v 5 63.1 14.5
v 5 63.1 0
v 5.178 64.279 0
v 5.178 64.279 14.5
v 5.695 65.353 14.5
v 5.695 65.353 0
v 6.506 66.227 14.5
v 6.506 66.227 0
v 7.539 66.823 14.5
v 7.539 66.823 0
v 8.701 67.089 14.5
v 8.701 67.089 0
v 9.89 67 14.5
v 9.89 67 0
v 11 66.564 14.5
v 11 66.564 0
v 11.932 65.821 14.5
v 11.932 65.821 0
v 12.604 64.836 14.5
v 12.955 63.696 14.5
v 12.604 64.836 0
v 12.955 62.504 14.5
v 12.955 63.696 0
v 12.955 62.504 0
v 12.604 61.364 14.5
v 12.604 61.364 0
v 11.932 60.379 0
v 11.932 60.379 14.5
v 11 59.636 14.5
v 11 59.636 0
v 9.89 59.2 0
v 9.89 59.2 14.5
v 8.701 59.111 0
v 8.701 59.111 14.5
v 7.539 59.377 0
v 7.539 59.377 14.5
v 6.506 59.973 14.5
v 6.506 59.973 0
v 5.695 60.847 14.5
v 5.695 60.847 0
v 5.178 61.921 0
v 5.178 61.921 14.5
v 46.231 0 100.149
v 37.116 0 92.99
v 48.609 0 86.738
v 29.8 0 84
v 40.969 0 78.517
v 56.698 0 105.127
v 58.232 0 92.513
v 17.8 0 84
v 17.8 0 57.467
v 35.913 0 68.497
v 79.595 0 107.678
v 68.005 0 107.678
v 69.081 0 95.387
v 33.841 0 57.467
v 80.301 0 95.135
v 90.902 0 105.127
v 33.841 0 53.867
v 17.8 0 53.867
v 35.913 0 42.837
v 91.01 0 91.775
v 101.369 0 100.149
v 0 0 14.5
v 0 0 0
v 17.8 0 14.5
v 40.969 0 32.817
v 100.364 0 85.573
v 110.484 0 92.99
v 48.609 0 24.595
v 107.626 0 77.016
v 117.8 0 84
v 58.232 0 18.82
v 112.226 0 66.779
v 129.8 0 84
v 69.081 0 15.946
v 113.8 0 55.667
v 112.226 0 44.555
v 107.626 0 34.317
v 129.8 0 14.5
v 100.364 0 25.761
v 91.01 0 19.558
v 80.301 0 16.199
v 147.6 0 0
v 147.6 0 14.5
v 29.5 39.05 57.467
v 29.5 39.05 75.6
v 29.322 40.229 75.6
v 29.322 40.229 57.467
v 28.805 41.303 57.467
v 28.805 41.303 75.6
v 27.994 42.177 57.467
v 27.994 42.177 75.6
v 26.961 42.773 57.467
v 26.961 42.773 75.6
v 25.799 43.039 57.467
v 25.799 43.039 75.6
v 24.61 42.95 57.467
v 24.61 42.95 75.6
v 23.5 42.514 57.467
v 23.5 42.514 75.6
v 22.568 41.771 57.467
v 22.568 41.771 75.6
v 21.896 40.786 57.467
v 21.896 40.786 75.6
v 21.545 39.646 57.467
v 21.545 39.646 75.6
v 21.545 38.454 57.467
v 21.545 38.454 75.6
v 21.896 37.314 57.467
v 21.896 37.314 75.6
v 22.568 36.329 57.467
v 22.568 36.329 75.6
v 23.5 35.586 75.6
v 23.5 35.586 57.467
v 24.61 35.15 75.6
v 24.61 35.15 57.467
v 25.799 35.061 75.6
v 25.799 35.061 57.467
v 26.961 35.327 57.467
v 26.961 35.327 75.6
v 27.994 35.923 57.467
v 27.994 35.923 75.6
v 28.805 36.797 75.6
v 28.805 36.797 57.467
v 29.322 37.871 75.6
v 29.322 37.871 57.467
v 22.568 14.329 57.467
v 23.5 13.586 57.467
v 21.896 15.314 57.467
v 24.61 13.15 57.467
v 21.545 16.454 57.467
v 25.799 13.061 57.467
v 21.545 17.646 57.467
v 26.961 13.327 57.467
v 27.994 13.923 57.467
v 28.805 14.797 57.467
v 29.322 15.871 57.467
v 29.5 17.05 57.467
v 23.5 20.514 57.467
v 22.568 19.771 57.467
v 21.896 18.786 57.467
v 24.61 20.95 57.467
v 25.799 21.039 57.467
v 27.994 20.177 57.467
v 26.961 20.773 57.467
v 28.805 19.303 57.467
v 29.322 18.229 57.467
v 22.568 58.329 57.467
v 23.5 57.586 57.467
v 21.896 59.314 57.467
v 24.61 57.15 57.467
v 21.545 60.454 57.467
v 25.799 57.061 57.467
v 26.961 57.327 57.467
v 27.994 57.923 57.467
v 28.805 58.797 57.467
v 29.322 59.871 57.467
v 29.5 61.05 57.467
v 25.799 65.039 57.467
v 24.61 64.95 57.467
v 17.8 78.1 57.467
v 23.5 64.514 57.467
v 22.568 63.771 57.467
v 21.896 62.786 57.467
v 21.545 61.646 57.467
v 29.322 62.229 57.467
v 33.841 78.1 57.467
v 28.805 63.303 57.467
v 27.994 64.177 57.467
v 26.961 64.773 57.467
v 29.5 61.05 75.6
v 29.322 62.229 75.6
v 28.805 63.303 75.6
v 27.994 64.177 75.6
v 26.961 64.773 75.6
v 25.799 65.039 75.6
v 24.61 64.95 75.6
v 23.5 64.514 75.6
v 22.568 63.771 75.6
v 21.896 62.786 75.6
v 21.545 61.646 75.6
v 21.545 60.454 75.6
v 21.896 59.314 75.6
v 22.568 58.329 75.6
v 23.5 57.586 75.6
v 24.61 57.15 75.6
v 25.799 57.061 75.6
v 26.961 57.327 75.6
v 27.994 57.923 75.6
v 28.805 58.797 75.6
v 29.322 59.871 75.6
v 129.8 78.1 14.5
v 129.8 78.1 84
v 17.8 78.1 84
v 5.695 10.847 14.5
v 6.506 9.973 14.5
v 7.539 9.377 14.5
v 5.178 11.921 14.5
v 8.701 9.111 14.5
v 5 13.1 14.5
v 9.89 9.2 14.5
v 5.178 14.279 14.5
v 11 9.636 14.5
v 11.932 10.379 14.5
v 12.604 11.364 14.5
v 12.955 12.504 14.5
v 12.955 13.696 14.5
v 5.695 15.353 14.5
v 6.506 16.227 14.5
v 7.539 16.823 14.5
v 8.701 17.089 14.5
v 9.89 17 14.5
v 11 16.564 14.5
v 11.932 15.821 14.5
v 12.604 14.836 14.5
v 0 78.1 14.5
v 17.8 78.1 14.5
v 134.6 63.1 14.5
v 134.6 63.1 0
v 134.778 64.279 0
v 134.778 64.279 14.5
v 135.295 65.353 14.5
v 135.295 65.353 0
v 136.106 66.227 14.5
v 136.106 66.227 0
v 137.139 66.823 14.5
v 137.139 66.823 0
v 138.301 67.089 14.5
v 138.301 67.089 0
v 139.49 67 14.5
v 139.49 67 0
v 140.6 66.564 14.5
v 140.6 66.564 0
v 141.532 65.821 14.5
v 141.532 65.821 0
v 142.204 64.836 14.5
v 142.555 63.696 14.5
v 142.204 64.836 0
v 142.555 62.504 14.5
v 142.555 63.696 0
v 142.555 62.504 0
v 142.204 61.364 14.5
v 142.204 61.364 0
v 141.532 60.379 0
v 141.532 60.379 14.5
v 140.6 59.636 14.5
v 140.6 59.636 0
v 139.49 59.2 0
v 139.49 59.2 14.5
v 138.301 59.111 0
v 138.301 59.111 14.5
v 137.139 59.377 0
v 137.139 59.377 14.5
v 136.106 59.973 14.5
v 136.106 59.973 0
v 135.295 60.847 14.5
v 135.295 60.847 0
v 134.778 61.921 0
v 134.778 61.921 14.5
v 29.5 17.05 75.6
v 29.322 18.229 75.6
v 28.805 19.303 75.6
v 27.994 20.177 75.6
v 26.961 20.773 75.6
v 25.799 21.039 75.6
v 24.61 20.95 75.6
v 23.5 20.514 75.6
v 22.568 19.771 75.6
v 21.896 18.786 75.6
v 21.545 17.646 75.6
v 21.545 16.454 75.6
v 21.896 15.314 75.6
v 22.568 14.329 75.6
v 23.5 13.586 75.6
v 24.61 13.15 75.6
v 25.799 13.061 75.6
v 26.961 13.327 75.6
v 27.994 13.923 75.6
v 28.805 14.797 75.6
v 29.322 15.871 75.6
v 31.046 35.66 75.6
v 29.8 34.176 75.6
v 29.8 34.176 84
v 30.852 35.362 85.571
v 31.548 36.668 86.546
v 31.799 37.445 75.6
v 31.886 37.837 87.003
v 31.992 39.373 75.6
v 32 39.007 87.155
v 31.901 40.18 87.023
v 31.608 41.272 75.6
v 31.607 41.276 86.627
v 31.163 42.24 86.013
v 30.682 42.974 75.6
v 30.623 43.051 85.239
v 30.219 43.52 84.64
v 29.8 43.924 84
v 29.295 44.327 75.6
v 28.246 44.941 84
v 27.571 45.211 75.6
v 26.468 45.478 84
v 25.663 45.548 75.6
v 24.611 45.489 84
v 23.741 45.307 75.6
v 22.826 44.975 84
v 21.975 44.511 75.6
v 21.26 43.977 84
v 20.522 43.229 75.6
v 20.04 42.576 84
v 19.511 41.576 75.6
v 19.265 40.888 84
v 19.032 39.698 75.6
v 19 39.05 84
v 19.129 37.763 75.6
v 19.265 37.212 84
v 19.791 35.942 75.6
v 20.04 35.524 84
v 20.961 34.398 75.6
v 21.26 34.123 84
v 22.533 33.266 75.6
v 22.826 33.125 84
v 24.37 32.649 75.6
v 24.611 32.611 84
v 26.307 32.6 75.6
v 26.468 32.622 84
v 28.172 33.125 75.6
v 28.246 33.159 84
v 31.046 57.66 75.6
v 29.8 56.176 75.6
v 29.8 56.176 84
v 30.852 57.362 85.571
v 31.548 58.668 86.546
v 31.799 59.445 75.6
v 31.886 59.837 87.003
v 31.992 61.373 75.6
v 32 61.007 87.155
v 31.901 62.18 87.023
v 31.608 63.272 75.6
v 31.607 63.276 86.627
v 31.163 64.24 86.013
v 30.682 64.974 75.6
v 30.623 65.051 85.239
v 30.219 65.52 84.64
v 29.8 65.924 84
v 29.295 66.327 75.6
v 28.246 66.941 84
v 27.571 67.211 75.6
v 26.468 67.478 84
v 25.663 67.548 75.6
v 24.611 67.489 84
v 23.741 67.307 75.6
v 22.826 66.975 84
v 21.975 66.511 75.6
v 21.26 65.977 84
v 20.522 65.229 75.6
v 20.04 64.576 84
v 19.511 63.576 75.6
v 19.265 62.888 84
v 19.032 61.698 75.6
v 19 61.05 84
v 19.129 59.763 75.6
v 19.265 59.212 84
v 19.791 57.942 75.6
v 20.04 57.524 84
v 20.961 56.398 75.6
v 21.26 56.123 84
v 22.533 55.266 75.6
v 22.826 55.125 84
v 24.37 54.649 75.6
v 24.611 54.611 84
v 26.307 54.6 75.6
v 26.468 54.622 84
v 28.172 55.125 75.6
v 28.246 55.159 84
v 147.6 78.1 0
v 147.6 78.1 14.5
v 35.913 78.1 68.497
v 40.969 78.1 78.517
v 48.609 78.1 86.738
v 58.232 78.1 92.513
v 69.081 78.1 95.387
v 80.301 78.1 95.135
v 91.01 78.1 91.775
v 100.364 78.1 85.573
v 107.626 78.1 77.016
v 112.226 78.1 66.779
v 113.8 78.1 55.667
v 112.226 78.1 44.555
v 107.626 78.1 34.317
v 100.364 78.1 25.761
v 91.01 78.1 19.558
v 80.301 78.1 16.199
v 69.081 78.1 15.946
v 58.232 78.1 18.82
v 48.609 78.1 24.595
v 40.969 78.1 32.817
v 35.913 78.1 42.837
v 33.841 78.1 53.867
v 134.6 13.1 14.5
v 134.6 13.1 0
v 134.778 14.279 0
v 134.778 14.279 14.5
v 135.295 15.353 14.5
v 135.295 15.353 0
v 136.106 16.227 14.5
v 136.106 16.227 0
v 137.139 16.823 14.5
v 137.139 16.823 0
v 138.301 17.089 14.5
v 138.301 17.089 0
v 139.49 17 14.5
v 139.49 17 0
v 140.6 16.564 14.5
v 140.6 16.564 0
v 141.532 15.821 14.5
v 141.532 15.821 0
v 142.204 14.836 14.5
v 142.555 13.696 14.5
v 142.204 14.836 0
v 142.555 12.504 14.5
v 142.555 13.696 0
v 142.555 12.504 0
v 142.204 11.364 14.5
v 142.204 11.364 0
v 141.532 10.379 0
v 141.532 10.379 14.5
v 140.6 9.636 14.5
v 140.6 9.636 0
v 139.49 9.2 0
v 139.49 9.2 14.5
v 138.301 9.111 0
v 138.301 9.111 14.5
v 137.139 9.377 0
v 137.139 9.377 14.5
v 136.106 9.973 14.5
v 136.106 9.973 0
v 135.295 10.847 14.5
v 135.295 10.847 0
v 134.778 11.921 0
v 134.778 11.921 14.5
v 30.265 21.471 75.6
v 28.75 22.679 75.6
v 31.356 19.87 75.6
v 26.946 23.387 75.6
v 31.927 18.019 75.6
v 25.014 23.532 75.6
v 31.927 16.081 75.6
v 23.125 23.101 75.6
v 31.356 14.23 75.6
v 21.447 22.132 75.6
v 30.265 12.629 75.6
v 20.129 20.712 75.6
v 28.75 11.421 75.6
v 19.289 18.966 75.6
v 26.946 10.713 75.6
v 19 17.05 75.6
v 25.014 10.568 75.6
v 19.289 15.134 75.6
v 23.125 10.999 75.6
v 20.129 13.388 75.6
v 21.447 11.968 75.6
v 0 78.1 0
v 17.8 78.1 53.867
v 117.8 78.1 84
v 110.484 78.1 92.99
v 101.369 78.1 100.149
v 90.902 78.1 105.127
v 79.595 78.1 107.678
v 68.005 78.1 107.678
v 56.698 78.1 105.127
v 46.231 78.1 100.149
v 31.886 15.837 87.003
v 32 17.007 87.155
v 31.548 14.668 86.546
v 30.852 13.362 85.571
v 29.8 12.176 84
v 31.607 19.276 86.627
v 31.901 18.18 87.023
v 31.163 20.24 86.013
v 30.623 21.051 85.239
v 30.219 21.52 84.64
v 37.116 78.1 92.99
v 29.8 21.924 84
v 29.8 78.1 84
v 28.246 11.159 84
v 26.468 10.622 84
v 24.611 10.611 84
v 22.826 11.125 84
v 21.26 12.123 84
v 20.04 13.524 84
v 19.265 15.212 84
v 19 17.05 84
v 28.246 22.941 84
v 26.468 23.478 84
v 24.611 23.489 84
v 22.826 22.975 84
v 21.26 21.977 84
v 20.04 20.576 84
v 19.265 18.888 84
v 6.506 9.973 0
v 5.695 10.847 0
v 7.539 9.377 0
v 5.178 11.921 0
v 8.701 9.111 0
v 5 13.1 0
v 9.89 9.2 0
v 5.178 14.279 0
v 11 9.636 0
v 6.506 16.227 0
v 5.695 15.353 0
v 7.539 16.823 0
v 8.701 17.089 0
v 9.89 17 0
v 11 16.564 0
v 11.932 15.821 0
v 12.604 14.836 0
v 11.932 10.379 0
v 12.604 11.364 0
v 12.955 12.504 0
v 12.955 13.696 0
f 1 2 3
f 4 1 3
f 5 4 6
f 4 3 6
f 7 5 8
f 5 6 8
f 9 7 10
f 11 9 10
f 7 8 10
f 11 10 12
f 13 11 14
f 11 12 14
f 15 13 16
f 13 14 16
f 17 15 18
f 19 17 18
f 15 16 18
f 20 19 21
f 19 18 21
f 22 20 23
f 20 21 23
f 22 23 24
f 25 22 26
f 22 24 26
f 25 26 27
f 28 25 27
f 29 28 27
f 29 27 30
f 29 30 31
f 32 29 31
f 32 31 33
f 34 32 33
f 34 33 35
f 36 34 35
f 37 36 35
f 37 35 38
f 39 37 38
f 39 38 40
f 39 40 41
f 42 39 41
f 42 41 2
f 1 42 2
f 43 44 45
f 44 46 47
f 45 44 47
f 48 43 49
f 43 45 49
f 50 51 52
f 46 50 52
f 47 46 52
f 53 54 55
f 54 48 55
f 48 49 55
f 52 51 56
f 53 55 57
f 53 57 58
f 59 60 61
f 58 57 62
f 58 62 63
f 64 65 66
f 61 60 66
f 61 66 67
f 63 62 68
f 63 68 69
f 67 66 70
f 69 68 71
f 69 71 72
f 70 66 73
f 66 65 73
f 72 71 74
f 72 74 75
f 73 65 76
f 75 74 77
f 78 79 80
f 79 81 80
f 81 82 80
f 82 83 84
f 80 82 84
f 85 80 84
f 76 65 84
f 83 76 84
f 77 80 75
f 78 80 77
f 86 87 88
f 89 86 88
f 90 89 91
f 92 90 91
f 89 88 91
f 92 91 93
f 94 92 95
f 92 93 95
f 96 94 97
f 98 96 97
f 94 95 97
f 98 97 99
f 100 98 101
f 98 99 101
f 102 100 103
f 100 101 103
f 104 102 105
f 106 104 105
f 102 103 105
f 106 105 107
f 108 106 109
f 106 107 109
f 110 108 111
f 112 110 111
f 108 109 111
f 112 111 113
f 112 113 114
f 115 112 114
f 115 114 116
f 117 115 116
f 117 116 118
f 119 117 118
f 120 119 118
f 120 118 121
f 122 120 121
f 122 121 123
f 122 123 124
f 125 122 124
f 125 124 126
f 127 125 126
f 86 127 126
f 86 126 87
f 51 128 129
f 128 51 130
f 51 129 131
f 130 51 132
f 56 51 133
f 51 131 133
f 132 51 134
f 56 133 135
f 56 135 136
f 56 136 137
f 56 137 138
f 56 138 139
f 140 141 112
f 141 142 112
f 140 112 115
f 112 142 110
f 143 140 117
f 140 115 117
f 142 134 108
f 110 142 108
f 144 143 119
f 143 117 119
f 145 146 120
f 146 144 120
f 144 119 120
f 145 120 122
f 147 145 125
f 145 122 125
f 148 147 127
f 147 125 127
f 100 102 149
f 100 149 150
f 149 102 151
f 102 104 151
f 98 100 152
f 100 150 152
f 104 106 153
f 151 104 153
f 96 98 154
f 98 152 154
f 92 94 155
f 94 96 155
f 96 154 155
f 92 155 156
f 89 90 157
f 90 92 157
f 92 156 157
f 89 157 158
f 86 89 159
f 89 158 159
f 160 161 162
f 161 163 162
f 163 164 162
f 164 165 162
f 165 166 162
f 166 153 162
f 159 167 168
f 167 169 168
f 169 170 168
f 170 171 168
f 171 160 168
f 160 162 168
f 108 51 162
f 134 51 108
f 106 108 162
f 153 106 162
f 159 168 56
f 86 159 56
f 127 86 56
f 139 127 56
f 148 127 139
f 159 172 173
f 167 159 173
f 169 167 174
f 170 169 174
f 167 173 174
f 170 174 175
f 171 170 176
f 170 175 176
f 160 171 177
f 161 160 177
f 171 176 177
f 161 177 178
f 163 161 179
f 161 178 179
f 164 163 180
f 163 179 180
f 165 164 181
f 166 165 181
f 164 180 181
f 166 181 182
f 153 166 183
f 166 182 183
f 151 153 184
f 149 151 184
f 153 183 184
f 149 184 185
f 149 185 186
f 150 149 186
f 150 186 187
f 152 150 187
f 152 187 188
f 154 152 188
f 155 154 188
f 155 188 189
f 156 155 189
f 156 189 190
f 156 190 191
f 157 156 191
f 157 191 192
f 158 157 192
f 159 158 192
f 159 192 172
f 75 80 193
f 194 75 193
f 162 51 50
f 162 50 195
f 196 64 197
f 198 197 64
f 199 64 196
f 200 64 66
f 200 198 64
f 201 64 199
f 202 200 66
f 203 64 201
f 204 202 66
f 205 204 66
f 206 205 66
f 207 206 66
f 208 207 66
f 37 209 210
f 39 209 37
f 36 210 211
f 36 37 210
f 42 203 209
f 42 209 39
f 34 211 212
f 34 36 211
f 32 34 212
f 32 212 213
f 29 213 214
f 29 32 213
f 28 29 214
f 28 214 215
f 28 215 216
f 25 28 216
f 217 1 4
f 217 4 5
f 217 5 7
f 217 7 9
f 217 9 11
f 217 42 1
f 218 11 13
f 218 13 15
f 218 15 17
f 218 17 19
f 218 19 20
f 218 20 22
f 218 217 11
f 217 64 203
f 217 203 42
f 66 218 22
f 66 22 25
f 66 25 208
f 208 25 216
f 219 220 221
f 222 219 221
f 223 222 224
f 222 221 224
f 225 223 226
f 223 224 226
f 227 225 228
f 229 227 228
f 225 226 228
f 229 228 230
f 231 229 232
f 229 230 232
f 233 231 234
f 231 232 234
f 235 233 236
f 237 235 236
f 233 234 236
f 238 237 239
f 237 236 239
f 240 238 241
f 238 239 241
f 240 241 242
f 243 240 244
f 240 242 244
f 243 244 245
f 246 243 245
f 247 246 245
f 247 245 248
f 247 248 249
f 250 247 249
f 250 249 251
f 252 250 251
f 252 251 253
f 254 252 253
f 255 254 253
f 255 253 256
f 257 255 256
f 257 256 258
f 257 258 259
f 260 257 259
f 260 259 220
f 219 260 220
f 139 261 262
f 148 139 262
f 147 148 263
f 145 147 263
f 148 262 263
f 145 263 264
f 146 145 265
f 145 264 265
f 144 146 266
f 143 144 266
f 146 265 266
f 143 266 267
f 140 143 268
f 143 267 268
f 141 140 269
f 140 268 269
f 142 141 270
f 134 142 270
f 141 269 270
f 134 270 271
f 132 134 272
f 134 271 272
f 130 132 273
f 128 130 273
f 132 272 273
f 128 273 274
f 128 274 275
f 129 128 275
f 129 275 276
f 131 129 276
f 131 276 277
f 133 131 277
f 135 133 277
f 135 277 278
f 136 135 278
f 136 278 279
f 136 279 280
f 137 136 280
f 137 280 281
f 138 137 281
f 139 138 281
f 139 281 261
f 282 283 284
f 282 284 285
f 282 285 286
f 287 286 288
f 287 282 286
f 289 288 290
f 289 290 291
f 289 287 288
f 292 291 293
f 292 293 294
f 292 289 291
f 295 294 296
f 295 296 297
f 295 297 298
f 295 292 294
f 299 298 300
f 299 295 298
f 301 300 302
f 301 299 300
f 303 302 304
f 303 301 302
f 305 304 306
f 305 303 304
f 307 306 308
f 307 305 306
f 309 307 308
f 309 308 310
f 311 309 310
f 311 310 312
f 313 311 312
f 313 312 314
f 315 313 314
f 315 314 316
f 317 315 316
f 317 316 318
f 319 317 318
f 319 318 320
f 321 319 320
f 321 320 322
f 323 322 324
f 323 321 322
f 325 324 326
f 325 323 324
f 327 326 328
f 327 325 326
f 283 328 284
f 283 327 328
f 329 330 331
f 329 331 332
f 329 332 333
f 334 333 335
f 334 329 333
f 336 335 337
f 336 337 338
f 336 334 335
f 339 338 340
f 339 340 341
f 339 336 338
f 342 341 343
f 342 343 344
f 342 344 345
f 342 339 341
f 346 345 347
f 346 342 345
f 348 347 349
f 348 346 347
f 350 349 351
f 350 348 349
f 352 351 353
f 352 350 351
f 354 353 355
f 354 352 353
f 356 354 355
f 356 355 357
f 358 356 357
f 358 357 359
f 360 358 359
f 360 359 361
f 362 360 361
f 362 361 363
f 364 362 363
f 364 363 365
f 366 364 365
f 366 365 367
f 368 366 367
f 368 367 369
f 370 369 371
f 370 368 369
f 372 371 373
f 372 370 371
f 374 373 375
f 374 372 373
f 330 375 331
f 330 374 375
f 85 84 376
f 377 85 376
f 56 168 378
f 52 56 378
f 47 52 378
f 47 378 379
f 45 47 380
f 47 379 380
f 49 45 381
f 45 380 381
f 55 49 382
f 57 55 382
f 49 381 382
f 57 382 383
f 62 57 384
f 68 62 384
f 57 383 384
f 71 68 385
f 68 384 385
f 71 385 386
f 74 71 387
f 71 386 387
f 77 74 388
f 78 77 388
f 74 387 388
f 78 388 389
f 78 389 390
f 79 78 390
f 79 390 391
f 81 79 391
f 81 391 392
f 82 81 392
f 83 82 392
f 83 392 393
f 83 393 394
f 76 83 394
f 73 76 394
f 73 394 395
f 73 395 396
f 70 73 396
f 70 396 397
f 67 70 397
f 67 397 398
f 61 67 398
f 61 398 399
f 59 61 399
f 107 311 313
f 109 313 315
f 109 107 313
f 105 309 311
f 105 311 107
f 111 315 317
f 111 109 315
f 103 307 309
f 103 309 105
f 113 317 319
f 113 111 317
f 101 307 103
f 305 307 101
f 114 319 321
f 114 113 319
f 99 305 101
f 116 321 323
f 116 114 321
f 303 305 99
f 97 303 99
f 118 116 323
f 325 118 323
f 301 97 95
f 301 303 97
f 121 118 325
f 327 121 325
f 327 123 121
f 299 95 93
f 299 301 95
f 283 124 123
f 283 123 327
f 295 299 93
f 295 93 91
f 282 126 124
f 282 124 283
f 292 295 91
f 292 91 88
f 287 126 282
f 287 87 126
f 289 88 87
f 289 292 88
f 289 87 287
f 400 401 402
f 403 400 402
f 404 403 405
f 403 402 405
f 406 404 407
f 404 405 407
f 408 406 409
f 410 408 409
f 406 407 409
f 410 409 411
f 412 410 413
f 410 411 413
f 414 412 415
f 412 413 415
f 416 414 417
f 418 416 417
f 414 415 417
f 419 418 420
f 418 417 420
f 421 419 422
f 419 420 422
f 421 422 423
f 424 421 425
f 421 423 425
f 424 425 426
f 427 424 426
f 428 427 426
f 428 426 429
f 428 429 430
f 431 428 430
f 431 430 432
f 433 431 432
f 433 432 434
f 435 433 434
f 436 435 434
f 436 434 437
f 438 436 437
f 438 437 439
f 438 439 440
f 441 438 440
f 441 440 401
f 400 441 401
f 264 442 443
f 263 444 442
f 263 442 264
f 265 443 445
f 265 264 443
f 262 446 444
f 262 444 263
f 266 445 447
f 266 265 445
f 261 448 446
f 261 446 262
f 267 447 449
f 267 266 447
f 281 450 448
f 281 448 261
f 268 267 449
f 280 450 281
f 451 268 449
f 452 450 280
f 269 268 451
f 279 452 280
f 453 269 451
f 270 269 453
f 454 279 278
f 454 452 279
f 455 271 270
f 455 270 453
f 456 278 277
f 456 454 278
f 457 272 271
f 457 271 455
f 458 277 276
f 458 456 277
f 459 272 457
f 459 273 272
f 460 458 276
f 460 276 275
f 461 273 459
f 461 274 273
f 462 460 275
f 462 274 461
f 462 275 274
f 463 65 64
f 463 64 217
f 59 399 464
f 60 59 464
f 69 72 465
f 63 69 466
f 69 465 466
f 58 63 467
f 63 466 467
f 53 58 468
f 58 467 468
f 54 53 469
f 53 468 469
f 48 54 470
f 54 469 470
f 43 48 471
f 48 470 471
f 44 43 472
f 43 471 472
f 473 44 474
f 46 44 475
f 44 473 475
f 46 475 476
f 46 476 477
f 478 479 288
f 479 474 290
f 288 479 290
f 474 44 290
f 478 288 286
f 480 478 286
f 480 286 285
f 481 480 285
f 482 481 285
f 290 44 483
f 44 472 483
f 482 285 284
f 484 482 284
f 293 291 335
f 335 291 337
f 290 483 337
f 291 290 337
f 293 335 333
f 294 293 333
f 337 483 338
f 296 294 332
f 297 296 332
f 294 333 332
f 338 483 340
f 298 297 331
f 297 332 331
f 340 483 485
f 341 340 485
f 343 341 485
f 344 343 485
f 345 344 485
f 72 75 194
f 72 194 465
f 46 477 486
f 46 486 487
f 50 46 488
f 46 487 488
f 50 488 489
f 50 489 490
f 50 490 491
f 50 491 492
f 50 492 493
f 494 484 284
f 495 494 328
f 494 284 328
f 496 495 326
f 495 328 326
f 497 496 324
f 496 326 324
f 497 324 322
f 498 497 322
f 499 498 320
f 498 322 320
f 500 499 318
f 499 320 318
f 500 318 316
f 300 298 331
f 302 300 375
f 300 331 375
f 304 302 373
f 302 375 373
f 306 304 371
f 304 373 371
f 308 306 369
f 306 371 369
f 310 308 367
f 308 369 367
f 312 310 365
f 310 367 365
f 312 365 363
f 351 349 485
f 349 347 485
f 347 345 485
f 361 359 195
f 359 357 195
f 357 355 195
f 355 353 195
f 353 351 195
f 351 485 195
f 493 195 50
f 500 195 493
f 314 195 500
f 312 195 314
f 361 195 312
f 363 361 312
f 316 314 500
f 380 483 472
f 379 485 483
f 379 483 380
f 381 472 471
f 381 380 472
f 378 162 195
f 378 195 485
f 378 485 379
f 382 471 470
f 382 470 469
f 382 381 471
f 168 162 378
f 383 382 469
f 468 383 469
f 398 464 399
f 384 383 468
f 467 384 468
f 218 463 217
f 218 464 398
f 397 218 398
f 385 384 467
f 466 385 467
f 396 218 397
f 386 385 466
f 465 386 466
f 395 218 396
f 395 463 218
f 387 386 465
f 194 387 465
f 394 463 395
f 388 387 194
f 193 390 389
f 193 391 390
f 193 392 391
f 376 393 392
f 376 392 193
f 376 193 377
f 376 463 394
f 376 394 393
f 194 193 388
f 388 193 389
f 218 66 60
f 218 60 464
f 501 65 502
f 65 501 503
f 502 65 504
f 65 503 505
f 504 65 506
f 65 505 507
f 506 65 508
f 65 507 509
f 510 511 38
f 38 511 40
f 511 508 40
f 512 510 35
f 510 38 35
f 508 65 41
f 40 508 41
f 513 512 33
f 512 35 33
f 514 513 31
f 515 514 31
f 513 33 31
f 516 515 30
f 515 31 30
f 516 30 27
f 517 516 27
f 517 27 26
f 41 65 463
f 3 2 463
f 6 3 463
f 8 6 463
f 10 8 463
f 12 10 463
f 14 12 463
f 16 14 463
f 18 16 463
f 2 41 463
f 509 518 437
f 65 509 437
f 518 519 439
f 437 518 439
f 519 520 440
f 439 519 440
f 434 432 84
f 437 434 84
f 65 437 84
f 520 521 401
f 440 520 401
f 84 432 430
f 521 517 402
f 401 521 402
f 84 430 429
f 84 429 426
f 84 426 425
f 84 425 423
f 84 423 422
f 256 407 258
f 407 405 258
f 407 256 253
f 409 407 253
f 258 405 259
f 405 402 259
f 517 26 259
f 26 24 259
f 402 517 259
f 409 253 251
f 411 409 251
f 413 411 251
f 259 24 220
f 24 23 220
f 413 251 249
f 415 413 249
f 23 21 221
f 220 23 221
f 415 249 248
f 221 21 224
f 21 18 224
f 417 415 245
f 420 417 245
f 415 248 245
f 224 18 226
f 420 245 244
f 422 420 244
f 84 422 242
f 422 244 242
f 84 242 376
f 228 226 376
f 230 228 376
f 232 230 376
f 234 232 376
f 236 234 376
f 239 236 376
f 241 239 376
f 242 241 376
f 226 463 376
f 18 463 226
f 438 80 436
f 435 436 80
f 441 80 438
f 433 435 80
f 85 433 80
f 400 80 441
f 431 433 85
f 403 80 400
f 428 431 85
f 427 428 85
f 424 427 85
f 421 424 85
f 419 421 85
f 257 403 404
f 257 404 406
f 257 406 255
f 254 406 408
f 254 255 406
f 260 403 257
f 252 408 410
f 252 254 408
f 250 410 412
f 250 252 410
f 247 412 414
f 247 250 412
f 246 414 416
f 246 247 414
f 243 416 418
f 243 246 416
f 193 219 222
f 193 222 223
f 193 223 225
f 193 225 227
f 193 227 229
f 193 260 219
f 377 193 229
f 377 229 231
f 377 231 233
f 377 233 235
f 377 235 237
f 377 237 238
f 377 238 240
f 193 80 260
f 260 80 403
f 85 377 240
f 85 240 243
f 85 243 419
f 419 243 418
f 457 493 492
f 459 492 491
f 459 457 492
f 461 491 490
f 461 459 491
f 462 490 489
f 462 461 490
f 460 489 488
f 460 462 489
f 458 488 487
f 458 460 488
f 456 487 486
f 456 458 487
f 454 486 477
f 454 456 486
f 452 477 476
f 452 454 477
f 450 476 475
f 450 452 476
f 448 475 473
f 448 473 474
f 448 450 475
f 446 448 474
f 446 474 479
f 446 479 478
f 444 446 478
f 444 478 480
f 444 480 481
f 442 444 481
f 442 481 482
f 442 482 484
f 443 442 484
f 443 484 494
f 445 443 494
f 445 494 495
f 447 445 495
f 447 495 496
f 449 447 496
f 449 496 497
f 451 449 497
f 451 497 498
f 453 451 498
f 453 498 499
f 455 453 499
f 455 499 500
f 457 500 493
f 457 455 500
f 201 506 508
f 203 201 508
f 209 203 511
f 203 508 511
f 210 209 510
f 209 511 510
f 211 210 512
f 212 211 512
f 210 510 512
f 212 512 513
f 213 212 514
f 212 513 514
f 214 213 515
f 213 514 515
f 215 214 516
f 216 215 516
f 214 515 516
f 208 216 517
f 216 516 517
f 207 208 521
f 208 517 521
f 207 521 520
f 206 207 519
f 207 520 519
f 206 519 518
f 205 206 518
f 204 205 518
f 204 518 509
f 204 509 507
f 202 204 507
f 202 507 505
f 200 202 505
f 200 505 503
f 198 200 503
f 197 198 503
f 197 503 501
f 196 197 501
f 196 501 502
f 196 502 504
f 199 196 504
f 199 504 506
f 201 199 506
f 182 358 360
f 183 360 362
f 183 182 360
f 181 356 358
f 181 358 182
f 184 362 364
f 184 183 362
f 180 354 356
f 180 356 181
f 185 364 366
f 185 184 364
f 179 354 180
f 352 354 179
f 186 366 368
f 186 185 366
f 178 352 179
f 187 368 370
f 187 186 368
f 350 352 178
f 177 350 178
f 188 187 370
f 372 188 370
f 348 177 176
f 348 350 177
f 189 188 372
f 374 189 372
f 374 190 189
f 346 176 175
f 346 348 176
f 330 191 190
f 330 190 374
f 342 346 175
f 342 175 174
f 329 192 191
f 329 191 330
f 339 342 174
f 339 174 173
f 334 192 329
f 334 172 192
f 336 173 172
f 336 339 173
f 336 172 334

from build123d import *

# Parameters (mm, degrees)
SKETCH1_W               = 147.6
SKETCH1_H               = 78.1
BOSS_EXTRUDE1_DEPTH     = 14.5
SKETCH2_W               = 112
SKETCH2_H               = 78.1
BOSS_EXTRUDE2_DEPTH     = 93.5
CUT_EXTRUDE1_REACH      = 200.87
CUT_EXTRUDE2_DEPTH      = 8.4
CUT_EXTRUDE2_DEPTH_BACK = 8.4
SKETCH4_R               = 6.5
CUT_EXTRUDE3_REACH      = 185.305
SKETCH5_R               = 4
SKETCH7_R               = 4
CUT_EXTRUDE4_DEPTH      = 199.870234166


with BuildPart() as part:
    # Sketch1 → Boss-Extrude1 (new body)
    with BuildSketch(Plane.XY):
        with Locations((73.8, 39.05)):
            Rectangle(SKETCH1_W, SKETCH1_H)
    extrude(amount=BOSS_EXTRUDE1_DEPTH)

    # Sketch2 → Boss-Extrude2 (add)
    with BuildSketch(Plane.XY.offset(14.5)):
        with Locations((73.8, 39.05)):
            Rectangle(SKETCH2_W, SKETCH2_H)
    extrude(amount=BOSS_EXTRUDE2_DEPTH)

    # Sketch3 → Cut-Extrude1 (cut, up to next)
    with BuildSketch(Plane(origin=(0, 78.1, 0), x_dir=(1, 0, 0), z_dir=(0, 1, 0)), mode=Mode.PRIVATE) as cut_extrude1_sk1:
        with BuildLine():
            ThreePointArc((117.8, -84), (98.859928172, -101.609868316), (73.8, -108))
            Line((73.8, -108), (129.8, -108))
            Line((129.8, -108), (129.8, -84))
            Line((129.8, -84), (117.8, -84))
        make_face()
    cut_extrude1_tool1 = extrude(cut_extrude1_sk1.sketch, amount=-CUT_EXTRUDE1_REACH, mode=Mode.PRIVATE) & part.part
    # Sketch3 → Cut-Extrude1 (cut, up to next)
    with BuildSketch(Plane(origin=(0, 78.1, 0), x_dir=(1, 0, 0), z_dir=(0, 1, 0)), mode=Mode.PRIVATE) as cut_extrude1_sk2:
        with BuildLine():
            Line((29.8, -84), (17.8, -84))
            Line((17.8, -84), (17.8, -108))
            Line((17.8, -108), (73.8, -108))
            ThreePointArc((73.8, -108), (48.740071828, -101.609868316), (29.8, -84))
        make_face()
    cut_extrude1_tool2 = extrude(cut_extrude1_sk2.sketch, amount=-CUT_EXTRUDE1_REACH, mode=Mode.PRIVATE) & part.part
    # Sketch3 → Cut-Extrude1 (cut, up to next)
    with BuildSketch(Plane(origin=(0, 78.1, 0), x_dir=(1, 0, 0), z_dir=(0, 1, 0)), mode=Mode.PRIVATE) as cut_extrude1_sk3:
        with BuildLine():
            Line((17.8, -53.866666667), (17.8, -57.466666667))
            Line((17.8, -57.466666667), (33.840520524, -57.466666667))
            ThreePointArc((33.840520524, -57.466666667), (113.8, -55.666666667), (33.840520524, -53.866666667))
            Line((33.840520524, -53.866666667), (17.8, -53.866666667))
        make_face()
    cut_extrude1_tool3 = extrude(cut_extrude1_sk3.sketch, amount=-CUT_EXTRUDE1_REACH, mode=Mode.PRIVATE) & part.part
    add(cut_extrude1_tool1.solids().sort_by_distance((115.258406, 78.1, 98.707997))[0], mode=Mode.SUBTRACT)
    add(cut_extrude1_tool2.solids().sort_by_distance((32.341594, 78.1, 98.707997))[0], mode=Mode.SUBTRACT)
    add(cut_extrude1_tool3.solids().sort_by_distance((73.255815, 78.1, 55.666667))[0], mode=Mode.SUBTRACT)

    # Sketch4 → Cut-Extrude2 (cut, two sides: drawn at the far end of the back side and taken through both)
    with BuildSketch(Plane.XY.offset(84).offset(-CUT_EXTRUDE2_DEPTH_BACK)):
        with Locations((25.5, 61.05)):
            Circle(SKETCH4_R)
        with Locations((25.5, 39.05)):
            Circle(SKETCH4_R)
        with Locations((25.5, 17.05)):
            Circle(SKETCH4_R)
    extrude(amount=CUT_EXTRUDE2_DEPTH + CUT_EXTRUDE2_DEPTH_BACK, mode=Mode.SUBTRACT)

    # Sketch5 → Cut-Extrude3 (cut, up to next)
    with BuildSketch(Plane.XY.offset(75.6), mode=Mode.PRIVATE) as cut_extrude3_sk1:
        with Locations((25.5, 61.05)):
            Circle(SKETCH5_R)
    cut_extrude3_tool1 = extrude(cut_extrude3_sk1.sketch, amount=-CUT_EXTRUDE3_REACH, mode=Mode.PRIVATE) & part.part
    # Sketch5 → Cut-Extrude3 (cut, up to next)
    with BuildSketch(Plane.XY.offset(75.6), mode=Mode.PRIVATE) as cut_extrude3_sk2:
        with Locations((25.5, 39.05)):
            Circle(SKETCH5_R)
    cut_extrude3_tool2 = extrude(cut_extrude3_sk2.sketch, amount=-CUT_EXTRUDE3_REACH, mode=Mode.PRIVATE) & part.part
    # Sketch5 → Cut-Extrude3 (cut, up to next)
    with BuildSketch(Plane.XY.offset(75.6), mode=Mode.PRIVATE) as cut_extrude3_sk3:
        with Locations((25.5, 17.05)):
            Circle(SKETCH5_R)
    cut_extrude3_tool3 = extrude(cut_extrude3_sk3.sketch, amount=-CUT_EXTRUDE3_REACH, mode=Mode.PRIVATE) & part.part
    add(cut_extrude3_tool1.solids().sort_by_distance((25.5, 61.05, 75.6))[0], mode=Mode.SUBTRACT)
    add(cut_extrude3_tool2.solids().sort_by_distance((25.5, 39.05, 75.6))[0], mode=Mode.SUBTRACT)
    add(cut_extrude3_tool3.solids().sort_by_distance((25.5, 17.05, 75.6))[0], mode=Mode.SUBTRACT)

    # Sketch7 → Cut-Extrude4 (cut, through all)
    with BuildSketch(Plane(origin=(0, 0, 0), x_dir=(-1, 0, 0), z_dir=(0, 0, -1))):
        with Locations((-9, 63.1)):
            Circle(SKETCH7_R)
        with Locations((-9, 13.1)):
            Circle(SKETCH7_R)
        with Locations((-138.6, 13.1)):
            Circle(SKETCH7_R)
        with Locations((-138.6, 63.1)):
            Circle(SKETCH7_R)
    extrude(amount=-CUT_EXTRUDE4_DEPTH, mode=Mode.SUBTRACT)


solid = part.part
